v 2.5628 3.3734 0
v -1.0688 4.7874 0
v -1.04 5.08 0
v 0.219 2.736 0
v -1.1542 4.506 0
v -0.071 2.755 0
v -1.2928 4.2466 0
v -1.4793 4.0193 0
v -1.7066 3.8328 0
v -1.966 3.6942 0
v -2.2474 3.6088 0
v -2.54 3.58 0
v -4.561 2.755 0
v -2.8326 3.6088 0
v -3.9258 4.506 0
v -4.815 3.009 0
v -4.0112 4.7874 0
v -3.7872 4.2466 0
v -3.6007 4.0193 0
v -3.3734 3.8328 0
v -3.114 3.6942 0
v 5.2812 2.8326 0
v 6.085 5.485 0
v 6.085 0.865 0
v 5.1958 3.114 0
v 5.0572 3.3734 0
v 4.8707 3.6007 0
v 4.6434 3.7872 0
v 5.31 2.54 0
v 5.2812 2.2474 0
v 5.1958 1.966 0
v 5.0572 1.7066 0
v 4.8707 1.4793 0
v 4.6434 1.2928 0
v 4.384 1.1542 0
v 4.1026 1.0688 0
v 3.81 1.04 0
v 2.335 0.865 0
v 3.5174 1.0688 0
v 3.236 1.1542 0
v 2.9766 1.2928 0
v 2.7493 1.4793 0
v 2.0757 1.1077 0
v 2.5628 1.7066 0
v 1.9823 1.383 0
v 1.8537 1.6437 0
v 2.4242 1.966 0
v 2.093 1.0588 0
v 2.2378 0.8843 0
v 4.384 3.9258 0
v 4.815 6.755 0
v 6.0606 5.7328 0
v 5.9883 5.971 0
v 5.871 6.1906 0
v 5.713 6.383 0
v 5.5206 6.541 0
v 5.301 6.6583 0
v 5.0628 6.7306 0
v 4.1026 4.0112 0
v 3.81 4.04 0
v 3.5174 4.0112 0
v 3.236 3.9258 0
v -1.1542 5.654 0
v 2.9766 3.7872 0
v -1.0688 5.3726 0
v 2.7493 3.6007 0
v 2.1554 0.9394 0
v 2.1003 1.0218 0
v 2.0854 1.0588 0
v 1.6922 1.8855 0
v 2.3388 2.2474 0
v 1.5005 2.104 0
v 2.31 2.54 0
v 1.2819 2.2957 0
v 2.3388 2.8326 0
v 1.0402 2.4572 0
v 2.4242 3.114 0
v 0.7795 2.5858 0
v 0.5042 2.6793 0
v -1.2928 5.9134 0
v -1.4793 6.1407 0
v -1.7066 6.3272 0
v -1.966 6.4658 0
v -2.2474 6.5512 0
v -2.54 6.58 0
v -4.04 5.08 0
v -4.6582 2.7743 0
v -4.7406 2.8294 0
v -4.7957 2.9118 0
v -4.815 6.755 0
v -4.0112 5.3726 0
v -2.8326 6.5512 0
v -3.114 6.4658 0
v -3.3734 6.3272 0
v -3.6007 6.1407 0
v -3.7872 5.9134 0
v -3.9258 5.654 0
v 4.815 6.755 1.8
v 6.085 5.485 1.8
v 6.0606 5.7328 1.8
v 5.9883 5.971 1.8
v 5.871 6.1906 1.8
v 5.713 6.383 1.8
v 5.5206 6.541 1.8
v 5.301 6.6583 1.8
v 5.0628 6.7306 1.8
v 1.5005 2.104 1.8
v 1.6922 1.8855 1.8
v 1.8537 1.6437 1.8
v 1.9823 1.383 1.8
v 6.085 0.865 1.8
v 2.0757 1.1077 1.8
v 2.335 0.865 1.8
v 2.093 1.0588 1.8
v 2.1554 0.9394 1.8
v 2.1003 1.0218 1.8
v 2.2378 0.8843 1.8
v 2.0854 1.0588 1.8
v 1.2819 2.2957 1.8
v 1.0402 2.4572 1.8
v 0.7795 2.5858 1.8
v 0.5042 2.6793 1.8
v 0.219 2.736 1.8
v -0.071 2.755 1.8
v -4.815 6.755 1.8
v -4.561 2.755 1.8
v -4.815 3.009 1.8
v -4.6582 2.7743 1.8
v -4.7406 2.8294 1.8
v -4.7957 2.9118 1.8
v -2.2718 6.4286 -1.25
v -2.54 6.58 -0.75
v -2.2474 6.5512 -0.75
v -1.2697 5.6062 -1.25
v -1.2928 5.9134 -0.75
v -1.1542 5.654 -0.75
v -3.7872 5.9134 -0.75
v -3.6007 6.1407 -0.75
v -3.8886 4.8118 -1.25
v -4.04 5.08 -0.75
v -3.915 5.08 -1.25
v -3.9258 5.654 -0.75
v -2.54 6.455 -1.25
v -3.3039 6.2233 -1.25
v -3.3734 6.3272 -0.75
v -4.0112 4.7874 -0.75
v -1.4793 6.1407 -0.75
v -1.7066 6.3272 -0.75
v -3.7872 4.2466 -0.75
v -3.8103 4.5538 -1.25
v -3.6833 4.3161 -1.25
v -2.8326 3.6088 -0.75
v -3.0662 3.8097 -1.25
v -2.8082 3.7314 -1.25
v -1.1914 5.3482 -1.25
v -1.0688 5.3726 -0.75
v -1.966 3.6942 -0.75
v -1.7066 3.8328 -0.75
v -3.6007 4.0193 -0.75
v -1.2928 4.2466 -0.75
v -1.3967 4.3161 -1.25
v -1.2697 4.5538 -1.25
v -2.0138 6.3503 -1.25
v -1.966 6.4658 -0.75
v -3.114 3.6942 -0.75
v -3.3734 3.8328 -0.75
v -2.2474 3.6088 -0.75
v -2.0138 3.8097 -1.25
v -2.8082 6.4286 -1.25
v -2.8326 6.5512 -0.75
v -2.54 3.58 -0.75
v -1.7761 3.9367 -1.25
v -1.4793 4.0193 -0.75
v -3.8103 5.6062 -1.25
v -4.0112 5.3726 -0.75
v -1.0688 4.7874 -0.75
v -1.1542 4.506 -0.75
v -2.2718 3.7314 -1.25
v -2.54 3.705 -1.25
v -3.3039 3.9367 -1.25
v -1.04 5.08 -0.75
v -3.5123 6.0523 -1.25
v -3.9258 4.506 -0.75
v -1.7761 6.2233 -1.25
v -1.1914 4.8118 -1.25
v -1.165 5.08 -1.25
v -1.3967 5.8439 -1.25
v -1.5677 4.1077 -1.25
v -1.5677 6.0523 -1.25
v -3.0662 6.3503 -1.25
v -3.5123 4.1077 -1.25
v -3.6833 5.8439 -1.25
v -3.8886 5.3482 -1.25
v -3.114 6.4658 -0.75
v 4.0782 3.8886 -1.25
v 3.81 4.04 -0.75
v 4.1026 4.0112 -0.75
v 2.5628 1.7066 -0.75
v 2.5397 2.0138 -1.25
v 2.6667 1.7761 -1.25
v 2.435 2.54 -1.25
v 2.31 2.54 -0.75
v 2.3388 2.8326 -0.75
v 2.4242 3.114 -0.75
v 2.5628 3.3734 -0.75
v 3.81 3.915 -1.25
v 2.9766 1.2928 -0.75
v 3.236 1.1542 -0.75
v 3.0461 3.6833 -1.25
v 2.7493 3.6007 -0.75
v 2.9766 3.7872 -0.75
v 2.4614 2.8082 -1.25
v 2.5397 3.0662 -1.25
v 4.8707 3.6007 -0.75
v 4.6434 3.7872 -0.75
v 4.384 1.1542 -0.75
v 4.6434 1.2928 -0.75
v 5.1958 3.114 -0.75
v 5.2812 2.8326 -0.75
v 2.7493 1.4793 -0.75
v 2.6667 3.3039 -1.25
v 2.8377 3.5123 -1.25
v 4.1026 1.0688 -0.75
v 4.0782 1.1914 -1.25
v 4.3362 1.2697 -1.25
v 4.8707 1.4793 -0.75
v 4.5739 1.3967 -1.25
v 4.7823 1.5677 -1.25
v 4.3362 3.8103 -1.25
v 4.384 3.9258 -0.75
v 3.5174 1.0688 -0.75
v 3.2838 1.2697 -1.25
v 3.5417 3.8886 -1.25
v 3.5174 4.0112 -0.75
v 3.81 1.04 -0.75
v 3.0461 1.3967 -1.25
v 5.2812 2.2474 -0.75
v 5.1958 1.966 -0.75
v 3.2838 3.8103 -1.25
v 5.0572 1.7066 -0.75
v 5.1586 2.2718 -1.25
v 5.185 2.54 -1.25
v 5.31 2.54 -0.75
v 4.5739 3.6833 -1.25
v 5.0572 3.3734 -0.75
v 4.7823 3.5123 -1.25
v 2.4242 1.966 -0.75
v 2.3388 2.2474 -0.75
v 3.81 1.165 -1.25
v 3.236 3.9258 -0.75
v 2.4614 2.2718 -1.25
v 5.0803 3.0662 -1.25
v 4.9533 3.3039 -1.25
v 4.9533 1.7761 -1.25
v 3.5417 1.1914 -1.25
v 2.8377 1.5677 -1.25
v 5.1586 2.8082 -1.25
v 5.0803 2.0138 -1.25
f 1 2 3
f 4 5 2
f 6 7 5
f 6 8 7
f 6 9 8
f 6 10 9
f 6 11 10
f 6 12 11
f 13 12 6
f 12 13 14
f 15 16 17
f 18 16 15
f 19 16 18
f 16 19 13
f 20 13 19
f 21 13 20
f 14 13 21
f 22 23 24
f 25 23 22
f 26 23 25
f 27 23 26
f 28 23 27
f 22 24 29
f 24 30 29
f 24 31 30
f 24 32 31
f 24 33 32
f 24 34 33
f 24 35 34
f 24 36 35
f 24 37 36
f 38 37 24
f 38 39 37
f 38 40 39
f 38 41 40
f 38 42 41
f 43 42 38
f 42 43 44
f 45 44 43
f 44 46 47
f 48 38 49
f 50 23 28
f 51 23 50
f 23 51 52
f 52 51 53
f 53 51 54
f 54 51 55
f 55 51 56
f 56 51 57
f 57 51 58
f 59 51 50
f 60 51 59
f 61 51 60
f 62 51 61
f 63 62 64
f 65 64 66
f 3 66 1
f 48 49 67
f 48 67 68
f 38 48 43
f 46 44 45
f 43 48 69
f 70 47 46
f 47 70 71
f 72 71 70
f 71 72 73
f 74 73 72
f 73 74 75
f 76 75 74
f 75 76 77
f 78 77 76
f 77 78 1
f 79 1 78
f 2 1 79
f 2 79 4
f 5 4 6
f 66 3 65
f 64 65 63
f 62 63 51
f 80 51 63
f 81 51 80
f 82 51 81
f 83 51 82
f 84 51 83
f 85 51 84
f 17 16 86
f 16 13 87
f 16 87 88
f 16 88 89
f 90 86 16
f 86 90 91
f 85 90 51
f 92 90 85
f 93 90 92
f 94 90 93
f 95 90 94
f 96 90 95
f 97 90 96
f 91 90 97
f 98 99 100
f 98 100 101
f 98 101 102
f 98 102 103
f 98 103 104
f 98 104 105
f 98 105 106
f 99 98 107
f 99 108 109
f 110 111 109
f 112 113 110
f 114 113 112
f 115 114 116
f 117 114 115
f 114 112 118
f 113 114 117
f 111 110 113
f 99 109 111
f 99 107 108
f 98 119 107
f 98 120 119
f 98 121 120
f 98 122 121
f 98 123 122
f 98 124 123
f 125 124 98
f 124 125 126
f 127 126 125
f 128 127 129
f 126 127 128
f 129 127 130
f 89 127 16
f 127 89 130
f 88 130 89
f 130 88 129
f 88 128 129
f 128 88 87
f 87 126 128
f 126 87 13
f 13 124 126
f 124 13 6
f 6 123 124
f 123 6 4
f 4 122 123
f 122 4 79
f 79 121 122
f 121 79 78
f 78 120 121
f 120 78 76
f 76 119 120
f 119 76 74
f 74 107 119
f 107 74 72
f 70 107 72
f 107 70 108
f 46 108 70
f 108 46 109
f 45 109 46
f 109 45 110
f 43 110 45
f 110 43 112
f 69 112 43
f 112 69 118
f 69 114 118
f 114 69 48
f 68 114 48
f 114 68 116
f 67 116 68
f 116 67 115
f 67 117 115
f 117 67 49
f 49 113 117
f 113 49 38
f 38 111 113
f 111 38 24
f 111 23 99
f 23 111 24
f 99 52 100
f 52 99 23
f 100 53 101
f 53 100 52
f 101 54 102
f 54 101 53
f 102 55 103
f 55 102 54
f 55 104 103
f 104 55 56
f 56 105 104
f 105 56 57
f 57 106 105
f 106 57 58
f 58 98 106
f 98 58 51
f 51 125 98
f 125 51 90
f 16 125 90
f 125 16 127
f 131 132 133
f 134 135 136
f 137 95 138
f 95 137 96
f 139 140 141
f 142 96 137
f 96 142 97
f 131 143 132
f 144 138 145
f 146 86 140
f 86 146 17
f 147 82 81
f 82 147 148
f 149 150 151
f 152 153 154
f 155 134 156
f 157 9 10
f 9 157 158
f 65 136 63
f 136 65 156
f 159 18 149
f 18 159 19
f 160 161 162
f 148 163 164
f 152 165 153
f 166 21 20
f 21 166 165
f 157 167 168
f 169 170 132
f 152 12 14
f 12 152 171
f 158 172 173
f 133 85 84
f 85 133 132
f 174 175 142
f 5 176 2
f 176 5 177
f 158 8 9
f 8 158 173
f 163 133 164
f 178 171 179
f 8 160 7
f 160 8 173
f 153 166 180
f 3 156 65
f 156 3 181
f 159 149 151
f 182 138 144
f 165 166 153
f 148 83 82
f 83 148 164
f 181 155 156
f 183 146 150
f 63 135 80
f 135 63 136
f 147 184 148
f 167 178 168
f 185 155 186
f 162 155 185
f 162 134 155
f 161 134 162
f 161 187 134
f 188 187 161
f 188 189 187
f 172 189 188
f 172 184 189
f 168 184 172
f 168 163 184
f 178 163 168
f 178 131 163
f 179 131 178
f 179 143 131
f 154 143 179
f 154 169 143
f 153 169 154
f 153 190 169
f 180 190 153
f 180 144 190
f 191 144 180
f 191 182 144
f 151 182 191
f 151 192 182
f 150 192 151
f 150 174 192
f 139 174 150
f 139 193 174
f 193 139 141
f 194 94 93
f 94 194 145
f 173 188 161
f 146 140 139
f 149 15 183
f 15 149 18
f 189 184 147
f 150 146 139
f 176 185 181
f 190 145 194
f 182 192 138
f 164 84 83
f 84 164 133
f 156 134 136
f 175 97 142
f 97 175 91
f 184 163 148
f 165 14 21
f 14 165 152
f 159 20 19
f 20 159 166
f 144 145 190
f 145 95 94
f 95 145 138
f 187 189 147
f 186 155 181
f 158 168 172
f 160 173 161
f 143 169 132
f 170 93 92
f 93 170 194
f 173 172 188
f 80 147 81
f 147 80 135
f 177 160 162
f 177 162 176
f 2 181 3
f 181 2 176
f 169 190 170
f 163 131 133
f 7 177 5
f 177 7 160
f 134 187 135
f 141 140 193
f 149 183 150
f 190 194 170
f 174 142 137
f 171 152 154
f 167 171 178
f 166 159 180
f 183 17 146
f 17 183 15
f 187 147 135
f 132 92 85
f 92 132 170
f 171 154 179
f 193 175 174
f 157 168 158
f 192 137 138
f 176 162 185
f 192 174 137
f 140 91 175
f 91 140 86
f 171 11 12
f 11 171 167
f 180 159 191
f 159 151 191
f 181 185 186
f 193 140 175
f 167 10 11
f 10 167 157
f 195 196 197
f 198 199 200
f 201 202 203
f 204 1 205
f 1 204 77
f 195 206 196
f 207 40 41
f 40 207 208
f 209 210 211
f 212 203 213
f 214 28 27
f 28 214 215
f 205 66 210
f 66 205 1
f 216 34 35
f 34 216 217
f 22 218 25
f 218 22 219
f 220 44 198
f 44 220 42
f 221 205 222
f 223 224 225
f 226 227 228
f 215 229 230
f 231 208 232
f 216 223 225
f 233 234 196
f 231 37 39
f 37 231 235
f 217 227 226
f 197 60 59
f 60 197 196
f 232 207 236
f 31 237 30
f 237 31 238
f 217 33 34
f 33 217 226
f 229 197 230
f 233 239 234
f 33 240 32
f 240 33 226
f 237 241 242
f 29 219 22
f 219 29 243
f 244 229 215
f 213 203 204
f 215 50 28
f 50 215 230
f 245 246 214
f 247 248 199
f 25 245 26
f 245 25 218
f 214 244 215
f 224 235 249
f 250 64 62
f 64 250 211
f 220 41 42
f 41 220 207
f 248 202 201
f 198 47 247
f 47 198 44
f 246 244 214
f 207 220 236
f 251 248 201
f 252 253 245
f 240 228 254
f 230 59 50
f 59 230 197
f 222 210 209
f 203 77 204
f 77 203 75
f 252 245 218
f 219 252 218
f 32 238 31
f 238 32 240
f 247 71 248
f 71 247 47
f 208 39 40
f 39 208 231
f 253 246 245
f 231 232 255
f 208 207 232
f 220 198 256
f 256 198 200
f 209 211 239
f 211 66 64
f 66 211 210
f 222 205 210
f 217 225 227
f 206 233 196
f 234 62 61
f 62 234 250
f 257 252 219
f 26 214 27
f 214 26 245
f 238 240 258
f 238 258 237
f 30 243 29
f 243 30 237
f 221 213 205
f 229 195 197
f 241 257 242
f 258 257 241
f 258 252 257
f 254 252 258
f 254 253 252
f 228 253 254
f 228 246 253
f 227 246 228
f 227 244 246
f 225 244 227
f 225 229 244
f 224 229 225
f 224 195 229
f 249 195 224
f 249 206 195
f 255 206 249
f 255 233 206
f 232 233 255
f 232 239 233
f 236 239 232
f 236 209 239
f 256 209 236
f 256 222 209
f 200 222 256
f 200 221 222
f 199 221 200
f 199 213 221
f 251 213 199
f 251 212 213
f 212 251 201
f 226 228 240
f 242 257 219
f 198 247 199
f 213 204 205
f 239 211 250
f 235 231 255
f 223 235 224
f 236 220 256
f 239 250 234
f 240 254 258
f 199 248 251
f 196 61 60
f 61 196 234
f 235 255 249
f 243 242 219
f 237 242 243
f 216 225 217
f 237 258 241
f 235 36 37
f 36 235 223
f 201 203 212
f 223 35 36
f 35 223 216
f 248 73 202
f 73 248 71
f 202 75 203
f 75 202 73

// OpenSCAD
/* Datasheet via NovelKeys */
/* https://novelkeys.xyz/products/kailh-pcb-sockets */
/* https://cdn.shopify.com/s/files/1/3099/8088/files/CPG151101S11_MX_Socket.pdf?4656976507916097806 */

/* https://cdn.shopify.com/s/files/1/3099/8088/files/CPG135001S30_Choc_PCB_Socket.pdf?11560148761728190369  */

unit = 1.27;
base_height = 1.8;
base_length = 10.9;
base_width = 5.89;
base_r1 = unit * 0.2;  // Small corner radius
base_r2 = unit;  // Large corner radius
base_r3 = unit * 1.75;  // Internal radius
base_w1 = 4.0;  // Short side
stud_height = 3.05;
stud_diameter = 3.00;
stud_ch_xy = 0.25;
stud_ch_z = 0.5;
stud_dx = 6.35;
stud_dy = 2.54;
cx = unit * 0.5;
cy = unit * 3;

module stud () {
     hull() {
          translate([0, 0, base_height + stud_ch_z - stud_height]) {
               cylinder(d=stud_diameter, h=stud_height - stud_ch_z);
          }
          translate([0, 0, base_height - stud_height]) {
               cylinder(d=stud_diameter - stud_ch_xy, h=stud_height);
          }
     }
}

module base_2d () {
     left = cx - base_length / 2;
     right = cx + base_length / 2;
     bottom = cy - base_width / 2;
     top = cy + base_width / 2;

     b1_sy = base_w1 - base_r1;
     b1_sx = 3.75;
     
     angle = 20;

     // Positive circle
     cpr = base_r1;
     cpx = right - b1_sx;
     cpy = bottom + cpr;

     // Negative circle
     cnr = base_r3;
     cny = top - base_w1 - cnr;

     th = cpr + cnr;
     ty = cpy - cny;
     tx = sqrt(th * th - ty * ty);

     cnx = cpx - tx;
     
     iy = cny + ty * cnr / th;


     union () {
          translate([left, top - b1_sy]) {
               square([base_length - base_r2, b1_sy]);
          }
          translate([right - b1_sx, bottom]) {
               square([b1_sx, base_width - base_r2]);
          }
          translate([left + base_r1, top - base_w1]) {
               square([base_length - base_r1 - base_r2, base_r1]);
          }

          translate([left + base_r1, top - b1_sy]) {
               circle(r=base_r1, $fn=16);
          }
          translate([right - base_r2, top - base_r2]) {
               circle(r=base_r2, $fn=32);
          }
          translate([cpx, cpy]) {
               circle(r=cpr, $fn=16);
          }
          difference() {
               translate([cnx, iy]) {
                    square([th, th]);
               }
               translate([cnx, cny]) {
                    circle(r=cnr, $fn=48);
               }
          }
     }
}

color("grey") {
     union () {
          linear_extrude(base_height) {
               base_2d();
          }

          translate([unit * -2, unit * 4, 0]) {
               stud($fn=32);
          }
          translate([unit * 3, unit * 2, 0]) {
               stud($fn=32);
          }
     }
}
